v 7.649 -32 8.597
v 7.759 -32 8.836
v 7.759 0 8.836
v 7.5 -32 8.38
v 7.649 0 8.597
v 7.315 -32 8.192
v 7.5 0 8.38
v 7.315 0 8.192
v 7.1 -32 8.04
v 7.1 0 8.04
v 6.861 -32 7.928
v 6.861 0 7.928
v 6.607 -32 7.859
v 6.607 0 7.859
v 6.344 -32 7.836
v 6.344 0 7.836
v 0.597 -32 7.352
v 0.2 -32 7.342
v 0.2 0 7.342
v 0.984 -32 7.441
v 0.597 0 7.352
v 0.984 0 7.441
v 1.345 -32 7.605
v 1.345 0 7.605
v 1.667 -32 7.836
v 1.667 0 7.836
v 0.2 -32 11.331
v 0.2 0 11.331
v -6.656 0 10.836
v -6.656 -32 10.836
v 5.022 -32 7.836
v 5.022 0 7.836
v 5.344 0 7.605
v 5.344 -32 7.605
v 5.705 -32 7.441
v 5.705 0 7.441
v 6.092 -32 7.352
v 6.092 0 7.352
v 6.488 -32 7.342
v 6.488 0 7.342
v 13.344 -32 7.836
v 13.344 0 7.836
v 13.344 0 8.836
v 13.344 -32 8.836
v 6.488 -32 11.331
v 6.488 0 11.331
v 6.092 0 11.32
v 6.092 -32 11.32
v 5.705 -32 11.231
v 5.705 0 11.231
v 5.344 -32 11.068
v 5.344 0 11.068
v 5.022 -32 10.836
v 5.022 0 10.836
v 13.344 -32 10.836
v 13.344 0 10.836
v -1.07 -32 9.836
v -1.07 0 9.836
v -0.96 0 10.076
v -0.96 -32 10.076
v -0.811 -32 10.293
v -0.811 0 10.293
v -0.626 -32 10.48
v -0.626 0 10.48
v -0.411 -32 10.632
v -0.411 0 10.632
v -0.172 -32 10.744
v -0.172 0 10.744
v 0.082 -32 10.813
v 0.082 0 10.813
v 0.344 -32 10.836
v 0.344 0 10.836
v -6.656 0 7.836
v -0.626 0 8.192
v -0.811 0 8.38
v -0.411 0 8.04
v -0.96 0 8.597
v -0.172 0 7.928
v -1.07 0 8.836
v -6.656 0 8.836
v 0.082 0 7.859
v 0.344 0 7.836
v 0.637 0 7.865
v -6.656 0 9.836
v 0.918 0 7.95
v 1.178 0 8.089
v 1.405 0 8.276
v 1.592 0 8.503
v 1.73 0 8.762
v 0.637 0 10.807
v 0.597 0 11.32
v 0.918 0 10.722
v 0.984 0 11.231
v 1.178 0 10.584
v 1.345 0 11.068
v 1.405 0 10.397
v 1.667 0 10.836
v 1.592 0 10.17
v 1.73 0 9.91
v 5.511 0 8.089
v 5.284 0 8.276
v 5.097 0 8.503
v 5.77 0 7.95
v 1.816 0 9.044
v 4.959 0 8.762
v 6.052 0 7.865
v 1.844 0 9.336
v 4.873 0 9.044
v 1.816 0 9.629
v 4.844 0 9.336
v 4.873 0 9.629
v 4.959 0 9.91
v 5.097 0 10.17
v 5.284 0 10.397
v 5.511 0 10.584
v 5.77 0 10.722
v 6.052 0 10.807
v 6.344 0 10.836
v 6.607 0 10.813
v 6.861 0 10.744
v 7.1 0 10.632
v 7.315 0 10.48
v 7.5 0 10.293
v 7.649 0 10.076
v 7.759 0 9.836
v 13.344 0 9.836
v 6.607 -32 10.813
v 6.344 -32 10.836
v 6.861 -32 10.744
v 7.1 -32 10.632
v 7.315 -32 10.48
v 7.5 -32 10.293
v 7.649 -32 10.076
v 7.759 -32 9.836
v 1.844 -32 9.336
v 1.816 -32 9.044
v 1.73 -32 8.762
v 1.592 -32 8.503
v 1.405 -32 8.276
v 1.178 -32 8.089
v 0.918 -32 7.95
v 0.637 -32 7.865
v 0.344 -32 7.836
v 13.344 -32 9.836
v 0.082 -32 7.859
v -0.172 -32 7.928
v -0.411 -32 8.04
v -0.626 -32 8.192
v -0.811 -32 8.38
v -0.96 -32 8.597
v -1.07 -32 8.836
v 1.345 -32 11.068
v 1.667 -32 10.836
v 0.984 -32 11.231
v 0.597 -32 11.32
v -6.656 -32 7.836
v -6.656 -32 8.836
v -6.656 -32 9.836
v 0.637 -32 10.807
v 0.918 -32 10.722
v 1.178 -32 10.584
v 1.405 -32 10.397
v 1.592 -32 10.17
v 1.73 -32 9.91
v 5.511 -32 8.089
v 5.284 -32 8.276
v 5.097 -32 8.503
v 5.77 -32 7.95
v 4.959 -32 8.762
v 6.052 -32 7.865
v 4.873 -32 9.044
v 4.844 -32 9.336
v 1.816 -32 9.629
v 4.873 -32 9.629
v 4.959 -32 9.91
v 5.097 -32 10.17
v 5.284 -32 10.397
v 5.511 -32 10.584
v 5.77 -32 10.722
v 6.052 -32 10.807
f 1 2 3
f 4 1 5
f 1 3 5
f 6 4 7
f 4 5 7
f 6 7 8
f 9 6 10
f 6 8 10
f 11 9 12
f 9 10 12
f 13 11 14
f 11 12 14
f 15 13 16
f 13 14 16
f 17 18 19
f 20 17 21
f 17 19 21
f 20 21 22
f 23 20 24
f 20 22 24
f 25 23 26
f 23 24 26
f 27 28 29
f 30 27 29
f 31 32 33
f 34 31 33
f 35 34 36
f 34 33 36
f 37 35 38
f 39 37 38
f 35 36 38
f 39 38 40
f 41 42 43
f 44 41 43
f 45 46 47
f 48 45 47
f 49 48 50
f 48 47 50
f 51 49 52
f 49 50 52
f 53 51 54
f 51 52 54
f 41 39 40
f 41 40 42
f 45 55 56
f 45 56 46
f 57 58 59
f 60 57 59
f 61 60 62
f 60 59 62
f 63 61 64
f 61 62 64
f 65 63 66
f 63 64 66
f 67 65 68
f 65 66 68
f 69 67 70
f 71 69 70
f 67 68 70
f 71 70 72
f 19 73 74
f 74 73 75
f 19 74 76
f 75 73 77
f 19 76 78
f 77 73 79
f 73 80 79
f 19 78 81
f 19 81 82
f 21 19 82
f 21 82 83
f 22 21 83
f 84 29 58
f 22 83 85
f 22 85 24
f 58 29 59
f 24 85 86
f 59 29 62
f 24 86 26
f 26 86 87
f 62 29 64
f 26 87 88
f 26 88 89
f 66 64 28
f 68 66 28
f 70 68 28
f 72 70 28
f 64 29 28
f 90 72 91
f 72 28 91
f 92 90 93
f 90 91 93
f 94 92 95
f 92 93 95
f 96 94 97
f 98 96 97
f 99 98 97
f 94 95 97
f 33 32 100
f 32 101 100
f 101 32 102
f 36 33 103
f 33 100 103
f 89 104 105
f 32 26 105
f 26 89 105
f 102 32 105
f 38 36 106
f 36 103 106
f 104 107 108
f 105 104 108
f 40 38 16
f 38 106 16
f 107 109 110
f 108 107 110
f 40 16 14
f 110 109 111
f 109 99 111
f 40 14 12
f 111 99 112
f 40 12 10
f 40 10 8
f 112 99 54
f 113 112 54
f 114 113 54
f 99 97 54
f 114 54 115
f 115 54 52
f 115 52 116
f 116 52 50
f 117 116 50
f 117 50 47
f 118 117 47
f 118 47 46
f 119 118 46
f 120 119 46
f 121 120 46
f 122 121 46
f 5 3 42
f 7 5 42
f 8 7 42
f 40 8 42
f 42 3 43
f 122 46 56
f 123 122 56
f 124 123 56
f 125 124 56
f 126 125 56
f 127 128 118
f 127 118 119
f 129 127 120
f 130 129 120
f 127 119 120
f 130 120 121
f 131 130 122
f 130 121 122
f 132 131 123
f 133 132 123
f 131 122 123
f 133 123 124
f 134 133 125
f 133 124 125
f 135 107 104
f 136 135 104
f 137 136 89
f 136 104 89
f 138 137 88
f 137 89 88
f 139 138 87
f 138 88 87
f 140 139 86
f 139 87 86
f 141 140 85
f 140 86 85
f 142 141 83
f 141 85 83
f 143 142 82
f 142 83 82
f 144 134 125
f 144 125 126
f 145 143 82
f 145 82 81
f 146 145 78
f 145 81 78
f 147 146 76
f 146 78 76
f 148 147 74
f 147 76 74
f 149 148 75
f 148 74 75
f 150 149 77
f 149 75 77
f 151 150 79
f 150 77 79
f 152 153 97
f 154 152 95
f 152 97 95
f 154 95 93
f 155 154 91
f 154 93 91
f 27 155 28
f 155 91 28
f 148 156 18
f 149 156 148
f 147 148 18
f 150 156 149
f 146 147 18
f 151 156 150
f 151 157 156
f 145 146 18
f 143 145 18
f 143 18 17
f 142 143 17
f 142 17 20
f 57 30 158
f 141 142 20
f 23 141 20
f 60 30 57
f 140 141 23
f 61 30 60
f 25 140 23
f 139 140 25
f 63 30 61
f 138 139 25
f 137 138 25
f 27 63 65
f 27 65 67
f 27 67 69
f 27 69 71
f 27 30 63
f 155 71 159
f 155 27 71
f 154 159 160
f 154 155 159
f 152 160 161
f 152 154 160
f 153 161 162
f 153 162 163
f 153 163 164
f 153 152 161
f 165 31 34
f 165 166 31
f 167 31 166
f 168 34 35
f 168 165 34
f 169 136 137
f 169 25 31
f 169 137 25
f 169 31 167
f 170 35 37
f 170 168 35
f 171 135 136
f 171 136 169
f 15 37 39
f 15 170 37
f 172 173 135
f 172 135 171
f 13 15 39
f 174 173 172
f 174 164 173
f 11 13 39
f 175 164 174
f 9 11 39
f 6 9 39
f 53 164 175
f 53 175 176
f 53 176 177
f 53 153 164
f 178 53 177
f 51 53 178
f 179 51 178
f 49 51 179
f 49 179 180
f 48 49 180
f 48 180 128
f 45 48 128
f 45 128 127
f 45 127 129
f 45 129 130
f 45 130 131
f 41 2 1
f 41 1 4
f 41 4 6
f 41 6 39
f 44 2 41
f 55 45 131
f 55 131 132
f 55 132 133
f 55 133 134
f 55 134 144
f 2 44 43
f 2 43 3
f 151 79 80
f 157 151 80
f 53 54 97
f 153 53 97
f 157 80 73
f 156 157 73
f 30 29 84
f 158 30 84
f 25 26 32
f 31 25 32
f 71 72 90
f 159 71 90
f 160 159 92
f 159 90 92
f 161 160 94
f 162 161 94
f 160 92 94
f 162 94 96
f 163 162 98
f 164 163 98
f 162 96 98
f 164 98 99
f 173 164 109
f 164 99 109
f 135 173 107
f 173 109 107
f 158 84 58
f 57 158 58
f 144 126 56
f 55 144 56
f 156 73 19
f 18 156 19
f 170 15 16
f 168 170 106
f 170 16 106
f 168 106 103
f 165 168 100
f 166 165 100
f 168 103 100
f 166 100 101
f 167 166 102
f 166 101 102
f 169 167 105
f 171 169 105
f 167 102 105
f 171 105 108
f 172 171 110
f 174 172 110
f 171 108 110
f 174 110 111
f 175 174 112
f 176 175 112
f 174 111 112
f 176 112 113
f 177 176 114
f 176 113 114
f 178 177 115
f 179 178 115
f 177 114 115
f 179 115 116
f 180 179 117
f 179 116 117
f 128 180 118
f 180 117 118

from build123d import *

# Parameters (mm, degrees)
F1_DEPTH = 32


# Not quite as in the source:
# - a feature names something its author has since deleted; it is built from what else it names


with BuildPart() as f1:
    # F0 (on Front) → F1 (new body)
    with BuildSketch(Plane.XZ):
        with BuildLine():
            Line((0.200491711, 11.3311297744), (-6.6555393256, 10.8363182701))
            Line((-6.6555393256, 10.8363182701), (-0.9784149812, 10.8363182701))
            ThreePointArc((-0.9784149812, 10.8363182701), (-0.429566386, 11.1804663417), (0.200491711, 11.3311297744))
        make_face()
        with BuildLine():
            Line((-0.9784149812, 10.8363182701), (-6.6555393256, 10.8363182701))
            Line((-6.6555393256, 10.8363182701), (-6.6555393256, 9.8363182701))
            Line((-6.6555393256, 9.8363182701), (-1.5920309988, 9.8363182701))
            ThreePointArc((-1.5920309988, 9.8363182701), (-1.3602002438, 10.382325514), (-0.9784149812, 10.8363182701))
        make_face()
        with BuildLine():
            ThreePointArc((0.200491711, 11.3311297744), (-0.429566386, 11.1804663417), (-0.9784149812, 10.8363182701))
            Line((-0.9784149812, 10.8363182701), (0.3444606744, 10.8363182701))
            Line((0.3444606744, 10.8363182701), (1.6673363299, 10.8363182701))
            ThreePointArc((1.6673363299, 10.8363182701), (0.9837296736, 11.2314001012), (0.200491711, 11.3311297744))
        make_face()
        with BuildLine():
            Line((0.3444606744, 10.8363182701), (-0.9784149812, 10.8363182701))
            ThreePointArc((-0.9784149812, 10.8363182701), (-1.3602002438, 10.382325514), (-1.5920309988, 9.8363182701))
            Line((-1.5920309988, 9.8363182701), (-1.069752888, 9.8363182701))
            ThreePointArc((-1.069752888, 9.8363182701), (-0.5215647294, 10.5610631415), (0.3444606744, 10.8363182701))
        make_face()
        with BuildLine():
            Line((1.6673363299, 10.8363182701), (0.3444606744, 10.8363182701))
            ThreePointArc((0.3444606744, 10.8363182701), (1.4051208461, 10.3969784419), (1.8444606744, 9.3363182701))
            ThreePointArc((1.8444606744, 9.3363182701), (1.4051208461, 8.2756580983), (0.3444606744, 7.8363182701))
            Line((0.3444606744, 7.8363182701), (1.6673363299, 7.8363182701))
            ThreePointArc((1.6673363299, 7.8363182701), (2.1673363299, 8.5134426146), (2.3444606744, 9.3363182701))
            ThreePointArc((2.3444606744, 9.3363182701), (2.1673363299, 10.1591939256), (1.6673363299, 10.8363182701))
        make_face()
        with BuildLine():
            Line((-1.5920309988, 8.8363182701), (-6.6555393256, 8.8363182701))
            Line((-6.6555393256, 8.8363182701), (-6.6555393256, 7.8363182701))
            Line((-6.6555393256, 7.8363182701), (-0.9784149812, 7.8363182701))
            ThreePointArc((-0.9784149812, 7.8363182701), (-1.3602002438, 8.2903110262), (-1.5920309988, 8.8363182701))
        make_face()
        with BuildLine():
            Line((5.0215850188, 10.8363182701), (1.6673363299, 10.8363182701))
            ThreePointArc((1.6673363299, 10.8363182701), (2.1673363299, 10.1591939256), (2.3444606744, 9.3363182701))
            ThreePointArc((2.3444606744, 9.3363182701), (2.1673363299, 8.5134426146), (1.6673363299, 7.8363182701))
            Line((1.6673363299, 7.8363182701), (5.0215850188, 7.8363182701))
            ThreePointArc((5.0215850188, 7.8363182701), (4.3444606744, 9.3363182701), (5.0215850188, 10.8363182701))
        make_face()
        with BuildLine():
            Line((-1.069752888, 8.8363182701), (-1.5920309988, 8.8363182701))
            ThreePointArc((-1.5920309988, 8.8363182701), (-1.3602002438, 8.2903110262), (-0.9784149812, 7.8363182701))
            Line((-0.9784149812, 7.8363182701), (0.3444606744, 7.8363182701))
            ThreePointArc((0.3444606744, 7.8363182701), (-0.5215647294, 8.1115733987), (-1.069752888, 8.8363182701))
        make_face()
        with BuildLine():
            Line((-0.9784149812, 7.8363182701), (-6.6555393256, 7.8363182701))
            Line((-6.6555393256, 7.8363182701), (0.200491711, 7.3415067658))
            ThreePointArc((0.200491711, 7.3415067658), (-0.429566386, 7.4921701986), (-0.9784149812, 7.8363182701))
        make_face()
        with BuildLine():
            ThreePointArc((6.4884296377, 11.3311297744), (5.7051916751, 11.2314001012), (5.0215850188, 10.8363182701))
            Line((5.0215850188, 10.8363182701), (6.344460699, 10.8363182701))
            Line((6.344460699, 10.8363182701), (7.6673363299, 10.8363182701))
            ThreePointArc((7.6673363299, 10.8363182701), (7.1184877347, 11.1804663417), (6.4884296377, 11.3311297744))
        make_face()
        with BuildLine():
            Line((6.344460699, 10.8363182701), (5.0215850188, 10.8363182701))
            ThreePointArc((5.0215850188, 10.8363182701), (4.3444606744, 9.3363182701), (5.0215850188, 7.8363182701))
            Line((5.0215850188, 7.8363182701), (6.3444606473, 7.8363182701))
            ThreePointArc((6.3444606473, 7.8363182701), (4.8444606744, 9.336318296), (6.344460699, 10.8363182701))
        make_face()
        with BuildLine():
            Line((1.6673363299, 7.8363182701), (0.3444606744, 7.8363182701))
            Line((0.3444606744, 7.8363182701), (-0.9784149812, 7.8363182701))
            ThreePointArc((-0.9784149812, 7.8363182701), (-0.429566386, 7.4921701986), (0.200491711, 7.3415067658))
            ThreePointArc((0.200491711, 7.3415067658), (0.9837296736, 7.441236439), (1.6673363299, 7.8363182701))
        make_face()
        with BuildLine():
            Line((7.6673363299, 10.8363182701), (6.344460699, 10.8363182701))
            ThreePointArc((6.344460699, 10.8363182701), (7.2104860882, 10.5610631344), (7.7586742367, 9.8363182701))
            Line((7.7586742367, 9.8363182701), (8.2809523475, 9.8363182701))
            ThreePointArc((8.2809523475, 9.8363182701), (8.0491215925, 10.382325514), (7.6673363299, 10.8363182701))
        make_face()
        with BuildLine():
            Line((13.3444606744, 10.8363182701), (6.4884296377, 11.3311297744))
            ThreePointArc((6.4884296377, 11.3311297744), (7.1184877347, 11.1804663417), (7.6673363299, 10.8363182701))
            Line((7.6673363299, 10.8363182701), (13.3444606744, 10.8363182701))
        make_face()
        with BuildLine():
            Line((6.3444606473, 7.8363182701), (5.0215850188, 7.8363182701))
            ThreePointArc((5.0215850188, 7.8363182701), (5.7051916751, 7.441236439), (6.4884296377, 7.3415067658))
            ThreePointArc((6.4884296377, 7.3415067658), (7.1184877347, 7.4921701986), (7.6673363299, 7.8363182701))
            Line((7.6673363299, 7.8363182701), (6.3444606473, 7.8363182701))
        make_face()
        with BuildLine():
            Line((13.3444606744, 10.8363182701), (7.6673363299, 10.8363182701))
            ThreePointArc((7.6673363299, 10.8363182701), (8.0491215925, 10.382325514), (8.2809523475, 9.8363182701))
            Line((8.2809523475, 9.8363182701), (13.3444606744, 9.8363182701))
            Line((13.3444606744, 9.8363182701), (13.3444606744, 10.8363182701))
        make_face()
        with BuildLine():
            ThreePointArc((7.7586742367, 8.8363182701), (7.2104860671, 8.1115733909), (6.3444606473, 7.8363182701))
            Line((6.3444606473, 7.8363182701), (7.6673363299, 7.8363182701))
            ThreePointArc((7.6673363299, 7.8363182701), (8.0491215925, 8.2903110262), (8.2809523475, 8.8363182701))
            Line((8.2809523475, 8.8363182701), (7.7586742367, 8.8363182701))
        make_face()
        with BuildLine():
            ThreePointArc((7.6673363299, 7.8363182701), (7.1184877347, 7.4921701986), (6.4884296377, 7.3415067658))
            Line((6.4884296377, 7.3415067658), (13.3444606744, 7.8363182701))
            Line((13.3444606744, 7.8363182701), (7.6673363299, 7.8363182701))
        make_face()
        with BuildLine():
            ThreePointArc((8.2809523475, 8.8363182701), (8.0491215925, 8.2903110262), (7.6673363299, 7.8363182701))
            Line((7.6673363299, 7.8363182701), (13.3444606744, 7.8363182701))
            Line((13.3444606744, 7.8363182701), (13.3444606744, 8.8363182701))
            Line((13.3444606744, 8.8363182701), (8.2809523475, 8.8363182701))
        make_face()
    extrude(amount=F1_DEPTH)


solid = f1.part
